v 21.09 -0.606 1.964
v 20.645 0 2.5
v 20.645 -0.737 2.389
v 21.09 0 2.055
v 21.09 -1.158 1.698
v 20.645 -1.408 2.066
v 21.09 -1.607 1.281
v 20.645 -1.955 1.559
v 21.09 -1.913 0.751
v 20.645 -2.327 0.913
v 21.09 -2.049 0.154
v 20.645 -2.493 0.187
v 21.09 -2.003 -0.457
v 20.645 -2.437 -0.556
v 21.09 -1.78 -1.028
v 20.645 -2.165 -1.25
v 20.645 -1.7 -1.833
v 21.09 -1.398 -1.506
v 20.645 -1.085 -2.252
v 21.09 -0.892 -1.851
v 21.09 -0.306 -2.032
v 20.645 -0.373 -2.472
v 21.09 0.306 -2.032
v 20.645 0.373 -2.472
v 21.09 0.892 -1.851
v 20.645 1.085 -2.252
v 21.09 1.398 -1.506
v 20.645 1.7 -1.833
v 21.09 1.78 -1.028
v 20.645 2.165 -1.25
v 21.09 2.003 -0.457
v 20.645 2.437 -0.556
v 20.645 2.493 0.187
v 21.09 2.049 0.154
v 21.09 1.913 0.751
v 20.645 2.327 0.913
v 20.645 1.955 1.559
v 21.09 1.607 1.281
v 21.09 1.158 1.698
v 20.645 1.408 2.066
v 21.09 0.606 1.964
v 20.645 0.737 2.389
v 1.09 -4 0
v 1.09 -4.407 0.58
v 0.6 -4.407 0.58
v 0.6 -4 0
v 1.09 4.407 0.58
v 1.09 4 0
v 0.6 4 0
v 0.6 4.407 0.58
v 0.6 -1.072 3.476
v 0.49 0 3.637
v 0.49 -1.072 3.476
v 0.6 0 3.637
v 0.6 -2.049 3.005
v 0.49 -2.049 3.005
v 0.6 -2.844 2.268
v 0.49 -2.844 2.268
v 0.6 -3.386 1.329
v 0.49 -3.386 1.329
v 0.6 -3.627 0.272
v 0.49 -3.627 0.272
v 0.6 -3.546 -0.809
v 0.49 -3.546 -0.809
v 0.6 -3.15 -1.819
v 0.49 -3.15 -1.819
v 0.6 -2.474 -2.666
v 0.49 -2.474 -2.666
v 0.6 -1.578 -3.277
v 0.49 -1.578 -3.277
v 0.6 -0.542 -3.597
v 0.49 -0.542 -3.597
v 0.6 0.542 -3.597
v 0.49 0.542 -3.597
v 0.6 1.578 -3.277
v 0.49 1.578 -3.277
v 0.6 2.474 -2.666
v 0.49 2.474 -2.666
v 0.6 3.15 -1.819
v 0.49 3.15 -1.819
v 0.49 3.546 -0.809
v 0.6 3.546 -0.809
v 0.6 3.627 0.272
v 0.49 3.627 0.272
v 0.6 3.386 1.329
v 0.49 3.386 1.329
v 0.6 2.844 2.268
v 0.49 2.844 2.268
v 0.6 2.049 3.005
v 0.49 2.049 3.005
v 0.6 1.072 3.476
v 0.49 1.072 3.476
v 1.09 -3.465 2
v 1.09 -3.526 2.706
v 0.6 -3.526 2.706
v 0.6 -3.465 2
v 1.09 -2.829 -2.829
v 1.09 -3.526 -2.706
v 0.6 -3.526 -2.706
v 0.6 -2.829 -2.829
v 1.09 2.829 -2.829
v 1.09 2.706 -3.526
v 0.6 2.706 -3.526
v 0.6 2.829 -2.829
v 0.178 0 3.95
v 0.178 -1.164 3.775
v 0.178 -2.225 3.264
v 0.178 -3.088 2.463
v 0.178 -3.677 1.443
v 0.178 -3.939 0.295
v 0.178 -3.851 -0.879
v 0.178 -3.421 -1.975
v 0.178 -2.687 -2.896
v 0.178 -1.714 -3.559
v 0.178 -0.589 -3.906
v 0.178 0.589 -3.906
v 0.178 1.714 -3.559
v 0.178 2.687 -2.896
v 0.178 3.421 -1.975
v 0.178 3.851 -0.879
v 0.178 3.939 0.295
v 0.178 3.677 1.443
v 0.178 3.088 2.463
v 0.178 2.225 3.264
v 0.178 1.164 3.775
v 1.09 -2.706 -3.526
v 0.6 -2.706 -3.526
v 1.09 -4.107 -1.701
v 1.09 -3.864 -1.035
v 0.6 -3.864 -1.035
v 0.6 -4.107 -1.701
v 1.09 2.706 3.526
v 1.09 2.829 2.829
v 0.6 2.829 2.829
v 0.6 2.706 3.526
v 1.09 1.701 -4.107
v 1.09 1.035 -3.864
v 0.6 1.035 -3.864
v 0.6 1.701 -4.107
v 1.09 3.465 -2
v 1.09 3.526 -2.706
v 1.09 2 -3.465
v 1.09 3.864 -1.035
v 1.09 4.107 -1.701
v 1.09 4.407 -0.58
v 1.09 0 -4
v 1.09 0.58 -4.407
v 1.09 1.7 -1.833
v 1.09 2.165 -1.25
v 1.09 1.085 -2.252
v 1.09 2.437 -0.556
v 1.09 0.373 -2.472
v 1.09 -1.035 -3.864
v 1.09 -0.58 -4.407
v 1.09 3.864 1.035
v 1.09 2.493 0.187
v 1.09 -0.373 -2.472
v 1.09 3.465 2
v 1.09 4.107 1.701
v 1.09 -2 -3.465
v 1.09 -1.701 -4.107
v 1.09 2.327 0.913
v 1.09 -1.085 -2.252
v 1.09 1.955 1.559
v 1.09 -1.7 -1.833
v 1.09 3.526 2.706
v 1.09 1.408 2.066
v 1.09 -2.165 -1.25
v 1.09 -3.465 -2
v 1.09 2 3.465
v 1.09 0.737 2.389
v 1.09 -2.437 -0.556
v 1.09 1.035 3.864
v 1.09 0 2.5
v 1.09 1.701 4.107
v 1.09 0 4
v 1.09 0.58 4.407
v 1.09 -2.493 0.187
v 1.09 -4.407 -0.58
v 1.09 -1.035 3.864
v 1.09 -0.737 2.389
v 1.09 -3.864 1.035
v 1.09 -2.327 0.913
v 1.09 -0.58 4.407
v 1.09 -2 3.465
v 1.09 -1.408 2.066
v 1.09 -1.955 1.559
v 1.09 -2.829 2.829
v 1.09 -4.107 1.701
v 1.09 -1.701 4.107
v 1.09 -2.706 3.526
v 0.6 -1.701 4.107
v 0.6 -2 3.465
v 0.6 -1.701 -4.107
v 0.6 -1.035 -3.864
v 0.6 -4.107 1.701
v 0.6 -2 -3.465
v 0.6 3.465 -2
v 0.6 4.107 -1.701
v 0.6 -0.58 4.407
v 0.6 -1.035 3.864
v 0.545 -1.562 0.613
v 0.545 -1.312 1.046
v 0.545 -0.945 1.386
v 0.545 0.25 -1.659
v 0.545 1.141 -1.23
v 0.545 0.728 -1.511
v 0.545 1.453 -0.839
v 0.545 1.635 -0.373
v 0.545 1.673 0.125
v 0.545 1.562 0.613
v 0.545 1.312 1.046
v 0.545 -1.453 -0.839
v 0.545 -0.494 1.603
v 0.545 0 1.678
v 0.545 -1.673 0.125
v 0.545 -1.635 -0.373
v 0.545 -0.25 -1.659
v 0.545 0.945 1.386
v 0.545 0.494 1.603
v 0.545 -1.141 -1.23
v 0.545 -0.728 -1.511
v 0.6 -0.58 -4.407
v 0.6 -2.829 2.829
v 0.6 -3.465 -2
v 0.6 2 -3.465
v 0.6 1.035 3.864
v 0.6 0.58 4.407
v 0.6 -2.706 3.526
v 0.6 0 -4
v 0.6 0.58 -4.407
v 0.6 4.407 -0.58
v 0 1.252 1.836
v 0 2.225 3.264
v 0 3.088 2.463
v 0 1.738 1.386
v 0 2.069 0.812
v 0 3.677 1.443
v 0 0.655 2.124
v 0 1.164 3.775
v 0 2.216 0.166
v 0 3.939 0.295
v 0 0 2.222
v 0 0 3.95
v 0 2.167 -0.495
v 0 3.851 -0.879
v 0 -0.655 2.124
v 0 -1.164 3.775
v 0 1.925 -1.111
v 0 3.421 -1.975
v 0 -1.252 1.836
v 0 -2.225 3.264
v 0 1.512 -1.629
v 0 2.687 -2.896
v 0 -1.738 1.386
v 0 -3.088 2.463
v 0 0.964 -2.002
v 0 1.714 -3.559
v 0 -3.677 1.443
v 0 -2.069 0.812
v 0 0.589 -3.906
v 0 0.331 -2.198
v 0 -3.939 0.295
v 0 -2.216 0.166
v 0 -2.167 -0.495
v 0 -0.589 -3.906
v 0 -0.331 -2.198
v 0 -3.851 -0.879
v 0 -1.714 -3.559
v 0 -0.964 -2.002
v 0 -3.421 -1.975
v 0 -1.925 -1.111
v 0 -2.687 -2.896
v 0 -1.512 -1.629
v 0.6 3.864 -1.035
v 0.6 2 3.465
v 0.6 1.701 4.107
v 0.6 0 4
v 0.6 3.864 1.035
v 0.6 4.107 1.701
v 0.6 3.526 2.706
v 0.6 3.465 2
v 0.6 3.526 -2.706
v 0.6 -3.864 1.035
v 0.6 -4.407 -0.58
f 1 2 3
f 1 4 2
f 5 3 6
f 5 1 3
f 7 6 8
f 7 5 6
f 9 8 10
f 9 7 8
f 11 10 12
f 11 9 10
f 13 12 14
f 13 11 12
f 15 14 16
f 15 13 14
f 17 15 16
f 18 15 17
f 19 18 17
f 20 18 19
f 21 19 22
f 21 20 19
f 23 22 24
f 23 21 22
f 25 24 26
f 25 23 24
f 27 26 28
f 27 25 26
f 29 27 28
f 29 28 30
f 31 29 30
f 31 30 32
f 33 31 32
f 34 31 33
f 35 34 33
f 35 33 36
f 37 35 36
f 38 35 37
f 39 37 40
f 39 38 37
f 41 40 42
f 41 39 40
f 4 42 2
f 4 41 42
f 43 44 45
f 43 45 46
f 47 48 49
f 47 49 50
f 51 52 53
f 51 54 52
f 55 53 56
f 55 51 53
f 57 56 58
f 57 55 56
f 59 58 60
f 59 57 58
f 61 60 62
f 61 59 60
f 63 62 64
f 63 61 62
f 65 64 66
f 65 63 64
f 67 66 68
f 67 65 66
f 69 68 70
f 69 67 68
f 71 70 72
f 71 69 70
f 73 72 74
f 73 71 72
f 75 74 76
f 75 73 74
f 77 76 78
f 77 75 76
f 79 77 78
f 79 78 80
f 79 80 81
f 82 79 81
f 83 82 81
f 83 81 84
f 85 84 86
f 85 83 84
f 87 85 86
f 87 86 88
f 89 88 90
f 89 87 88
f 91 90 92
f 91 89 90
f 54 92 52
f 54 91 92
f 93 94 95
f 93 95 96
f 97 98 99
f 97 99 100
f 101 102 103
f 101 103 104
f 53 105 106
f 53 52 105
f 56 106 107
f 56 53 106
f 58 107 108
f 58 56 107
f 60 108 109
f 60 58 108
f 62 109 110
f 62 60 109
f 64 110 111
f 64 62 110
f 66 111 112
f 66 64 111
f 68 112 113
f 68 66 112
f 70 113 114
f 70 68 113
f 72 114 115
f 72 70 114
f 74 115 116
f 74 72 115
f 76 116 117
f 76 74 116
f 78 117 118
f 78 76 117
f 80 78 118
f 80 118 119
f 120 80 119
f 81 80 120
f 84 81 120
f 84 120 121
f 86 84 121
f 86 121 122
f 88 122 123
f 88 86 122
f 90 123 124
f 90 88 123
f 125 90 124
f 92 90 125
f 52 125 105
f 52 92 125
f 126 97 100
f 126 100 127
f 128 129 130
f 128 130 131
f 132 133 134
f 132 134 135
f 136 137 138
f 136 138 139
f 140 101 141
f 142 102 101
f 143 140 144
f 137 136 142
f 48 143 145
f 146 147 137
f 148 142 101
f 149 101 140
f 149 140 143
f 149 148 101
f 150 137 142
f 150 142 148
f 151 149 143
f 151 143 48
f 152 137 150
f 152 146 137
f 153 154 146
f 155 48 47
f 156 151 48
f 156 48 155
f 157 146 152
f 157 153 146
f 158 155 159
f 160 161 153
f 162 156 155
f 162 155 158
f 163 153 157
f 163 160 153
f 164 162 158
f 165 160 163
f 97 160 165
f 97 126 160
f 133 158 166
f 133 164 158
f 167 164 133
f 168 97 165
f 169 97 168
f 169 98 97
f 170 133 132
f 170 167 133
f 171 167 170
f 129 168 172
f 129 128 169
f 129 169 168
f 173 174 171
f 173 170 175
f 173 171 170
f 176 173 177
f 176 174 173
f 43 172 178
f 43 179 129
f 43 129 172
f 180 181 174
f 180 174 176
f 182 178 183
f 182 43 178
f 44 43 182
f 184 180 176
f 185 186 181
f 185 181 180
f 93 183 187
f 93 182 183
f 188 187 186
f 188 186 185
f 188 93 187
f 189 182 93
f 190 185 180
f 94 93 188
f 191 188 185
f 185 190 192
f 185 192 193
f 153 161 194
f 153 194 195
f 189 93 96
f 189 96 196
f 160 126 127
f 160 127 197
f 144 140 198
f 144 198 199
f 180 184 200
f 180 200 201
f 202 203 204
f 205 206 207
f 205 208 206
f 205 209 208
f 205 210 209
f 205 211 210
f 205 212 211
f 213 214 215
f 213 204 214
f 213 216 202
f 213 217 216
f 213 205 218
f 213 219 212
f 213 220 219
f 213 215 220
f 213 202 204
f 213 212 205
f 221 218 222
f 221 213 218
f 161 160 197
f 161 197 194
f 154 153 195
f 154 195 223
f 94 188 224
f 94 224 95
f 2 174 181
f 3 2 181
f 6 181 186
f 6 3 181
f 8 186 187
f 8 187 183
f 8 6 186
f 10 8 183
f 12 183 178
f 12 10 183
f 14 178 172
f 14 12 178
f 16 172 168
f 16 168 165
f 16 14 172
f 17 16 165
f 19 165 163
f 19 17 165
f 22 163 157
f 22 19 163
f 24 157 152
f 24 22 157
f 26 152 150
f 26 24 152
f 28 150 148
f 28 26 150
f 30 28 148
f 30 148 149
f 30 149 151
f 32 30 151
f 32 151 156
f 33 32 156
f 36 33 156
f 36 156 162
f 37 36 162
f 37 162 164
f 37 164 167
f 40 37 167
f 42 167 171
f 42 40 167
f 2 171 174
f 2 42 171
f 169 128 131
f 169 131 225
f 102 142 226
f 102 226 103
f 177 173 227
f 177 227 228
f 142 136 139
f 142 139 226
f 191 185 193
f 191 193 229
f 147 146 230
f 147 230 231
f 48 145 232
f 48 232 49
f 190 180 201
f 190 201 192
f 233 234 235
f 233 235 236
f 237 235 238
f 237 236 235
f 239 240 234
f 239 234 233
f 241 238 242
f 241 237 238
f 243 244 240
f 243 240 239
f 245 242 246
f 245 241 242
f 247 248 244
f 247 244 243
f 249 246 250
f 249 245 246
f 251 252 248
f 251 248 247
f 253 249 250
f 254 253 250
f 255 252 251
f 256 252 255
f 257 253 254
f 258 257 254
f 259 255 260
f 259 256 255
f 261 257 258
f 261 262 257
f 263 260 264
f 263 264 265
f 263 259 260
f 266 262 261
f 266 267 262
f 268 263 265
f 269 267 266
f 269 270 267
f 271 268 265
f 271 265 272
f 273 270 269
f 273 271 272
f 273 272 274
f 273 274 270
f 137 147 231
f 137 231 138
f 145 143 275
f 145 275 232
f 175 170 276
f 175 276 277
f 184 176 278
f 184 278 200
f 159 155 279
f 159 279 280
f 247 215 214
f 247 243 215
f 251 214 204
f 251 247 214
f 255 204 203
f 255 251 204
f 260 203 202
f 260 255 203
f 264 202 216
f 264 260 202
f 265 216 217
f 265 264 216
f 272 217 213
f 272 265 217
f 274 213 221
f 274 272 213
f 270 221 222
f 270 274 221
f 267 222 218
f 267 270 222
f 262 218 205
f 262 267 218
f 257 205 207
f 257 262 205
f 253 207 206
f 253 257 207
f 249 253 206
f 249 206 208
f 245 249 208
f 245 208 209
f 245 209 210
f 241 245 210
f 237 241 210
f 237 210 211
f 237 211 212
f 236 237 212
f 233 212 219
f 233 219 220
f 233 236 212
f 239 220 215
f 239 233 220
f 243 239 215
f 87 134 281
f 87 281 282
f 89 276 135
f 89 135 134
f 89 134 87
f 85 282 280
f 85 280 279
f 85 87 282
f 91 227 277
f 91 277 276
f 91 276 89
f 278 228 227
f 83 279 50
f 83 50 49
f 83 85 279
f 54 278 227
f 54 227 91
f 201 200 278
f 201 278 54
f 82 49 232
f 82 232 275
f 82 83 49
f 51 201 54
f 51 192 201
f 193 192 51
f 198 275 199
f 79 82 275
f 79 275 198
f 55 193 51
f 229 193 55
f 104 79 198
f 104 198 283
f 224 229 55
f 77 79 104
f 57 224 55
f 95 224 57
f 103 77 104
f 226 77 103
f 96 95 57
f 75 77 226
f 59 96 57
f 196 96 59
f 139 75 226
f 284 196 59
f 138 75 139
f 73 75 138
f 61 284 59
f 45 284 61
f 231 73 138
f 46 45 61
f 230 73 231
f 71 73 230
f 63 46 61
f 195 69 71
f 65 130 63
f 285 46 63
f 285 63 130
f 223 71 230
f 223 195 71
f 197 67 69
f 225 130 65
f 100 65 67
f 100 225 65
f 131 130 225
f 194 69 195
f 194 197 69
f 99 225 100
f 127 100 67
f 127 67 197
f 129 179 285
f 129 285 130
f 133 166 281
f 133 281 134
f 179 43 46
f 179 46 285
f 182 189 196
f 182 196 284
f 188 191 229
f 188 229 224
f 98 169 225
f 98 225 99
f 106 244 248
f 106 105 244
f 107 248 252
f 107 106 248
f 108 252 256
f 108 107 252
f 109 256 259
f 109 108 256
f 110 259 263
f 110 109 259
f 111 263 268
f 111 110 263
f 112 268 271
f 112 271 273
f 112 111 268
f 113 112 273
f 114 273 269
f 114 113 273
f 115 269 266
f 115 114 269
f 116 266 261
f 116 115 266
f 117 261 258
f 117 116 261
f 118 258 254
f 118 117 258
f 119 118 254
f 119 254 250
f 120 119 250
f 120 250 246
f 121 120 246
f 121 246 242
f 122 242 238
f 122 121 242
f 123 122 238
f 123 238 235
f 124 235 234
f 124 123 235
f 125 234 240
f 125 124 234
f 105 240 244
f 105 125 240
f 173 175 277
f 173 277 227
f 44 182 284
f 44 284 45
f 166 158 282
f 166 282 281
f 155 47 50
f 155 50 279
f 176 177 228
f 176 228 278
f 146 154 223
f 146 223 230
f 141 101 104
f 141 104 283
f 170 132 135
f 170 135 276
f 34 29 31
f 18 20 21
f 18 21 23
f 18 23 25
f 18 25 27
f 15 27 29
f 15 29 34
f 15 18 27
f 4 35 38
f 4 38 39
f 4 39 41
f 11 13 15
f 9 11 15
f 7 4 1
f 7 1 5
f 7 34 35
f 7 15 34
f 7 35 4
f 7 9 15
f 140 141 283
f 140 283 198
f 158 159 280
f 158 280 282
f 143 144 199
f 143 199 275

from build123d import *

# Parameters (mm, degrees)
CLINCHCUT_DEPTH    = 0.4905
CLINCHCUTPAT_COUNT = 24
CLINCHCUTPAT_ANGLE = 345


with BuildPart() as part:
    # BodySke → BaseBody (revolve)
    with BuildSketch(Plane.XY, mode=Mode.PRIVATE) as basebody_sk:
        Polygon((0, 2.2225), (0, 3.95), (0.1778, 3.95), (0.4905, 3.6373), (0.5995, 3.6373), (0.5995, 4.445), (1.09, 4.445), (1.09, 2.5), (20.645, 2.5), (21.09, 2.055), (21.09, 0), (0.545, 0), (0.545, 1.6775), align=None)
    revolve(basebody_sk.sketch.rotate(Axis((0, 0, 0), (1, 0, 0)), 90), axis=Axis((0, 0, 0), (1, 0, 0)))

    # CliRinCutSke → ClinchCut (cut)
    with BuildSketch(Plane(origin=(1.09, 0, 0), x_dir=(0, 0, -1), z_dir=(1, 0, 0))):
        with BuildLine():
            Line((0.580188924, 4.406972409), (0, 4.0005))
            Line((0, 4.0005), (-0.580188924, 4.406972409))
            ThreePointArc((-0.580188924, 4.406972409), (0, 4.445), (0.580188924, 4.406972409))
        make_face()
    clinchcut = extrude(amount=-CLINCHCUT_DEPTH, mode=Mode.SUBTRACT)

    # ClinchCutPat: ClinchCut ×24 about axis
    clinchcutpat_axis = Axis((0, 0, 0), (1, 0, 0))
    for i in range(1, CLINCHCUTPAT_COUNT):
        add(clinchcut.rotate(clinchcutpat_axis, i * CLINCHCUTPAT_ANGLE / (CLINCHCUTPAT_COUNT - 1)), mode=Mode.SUBTRACT)


solid = part.part
